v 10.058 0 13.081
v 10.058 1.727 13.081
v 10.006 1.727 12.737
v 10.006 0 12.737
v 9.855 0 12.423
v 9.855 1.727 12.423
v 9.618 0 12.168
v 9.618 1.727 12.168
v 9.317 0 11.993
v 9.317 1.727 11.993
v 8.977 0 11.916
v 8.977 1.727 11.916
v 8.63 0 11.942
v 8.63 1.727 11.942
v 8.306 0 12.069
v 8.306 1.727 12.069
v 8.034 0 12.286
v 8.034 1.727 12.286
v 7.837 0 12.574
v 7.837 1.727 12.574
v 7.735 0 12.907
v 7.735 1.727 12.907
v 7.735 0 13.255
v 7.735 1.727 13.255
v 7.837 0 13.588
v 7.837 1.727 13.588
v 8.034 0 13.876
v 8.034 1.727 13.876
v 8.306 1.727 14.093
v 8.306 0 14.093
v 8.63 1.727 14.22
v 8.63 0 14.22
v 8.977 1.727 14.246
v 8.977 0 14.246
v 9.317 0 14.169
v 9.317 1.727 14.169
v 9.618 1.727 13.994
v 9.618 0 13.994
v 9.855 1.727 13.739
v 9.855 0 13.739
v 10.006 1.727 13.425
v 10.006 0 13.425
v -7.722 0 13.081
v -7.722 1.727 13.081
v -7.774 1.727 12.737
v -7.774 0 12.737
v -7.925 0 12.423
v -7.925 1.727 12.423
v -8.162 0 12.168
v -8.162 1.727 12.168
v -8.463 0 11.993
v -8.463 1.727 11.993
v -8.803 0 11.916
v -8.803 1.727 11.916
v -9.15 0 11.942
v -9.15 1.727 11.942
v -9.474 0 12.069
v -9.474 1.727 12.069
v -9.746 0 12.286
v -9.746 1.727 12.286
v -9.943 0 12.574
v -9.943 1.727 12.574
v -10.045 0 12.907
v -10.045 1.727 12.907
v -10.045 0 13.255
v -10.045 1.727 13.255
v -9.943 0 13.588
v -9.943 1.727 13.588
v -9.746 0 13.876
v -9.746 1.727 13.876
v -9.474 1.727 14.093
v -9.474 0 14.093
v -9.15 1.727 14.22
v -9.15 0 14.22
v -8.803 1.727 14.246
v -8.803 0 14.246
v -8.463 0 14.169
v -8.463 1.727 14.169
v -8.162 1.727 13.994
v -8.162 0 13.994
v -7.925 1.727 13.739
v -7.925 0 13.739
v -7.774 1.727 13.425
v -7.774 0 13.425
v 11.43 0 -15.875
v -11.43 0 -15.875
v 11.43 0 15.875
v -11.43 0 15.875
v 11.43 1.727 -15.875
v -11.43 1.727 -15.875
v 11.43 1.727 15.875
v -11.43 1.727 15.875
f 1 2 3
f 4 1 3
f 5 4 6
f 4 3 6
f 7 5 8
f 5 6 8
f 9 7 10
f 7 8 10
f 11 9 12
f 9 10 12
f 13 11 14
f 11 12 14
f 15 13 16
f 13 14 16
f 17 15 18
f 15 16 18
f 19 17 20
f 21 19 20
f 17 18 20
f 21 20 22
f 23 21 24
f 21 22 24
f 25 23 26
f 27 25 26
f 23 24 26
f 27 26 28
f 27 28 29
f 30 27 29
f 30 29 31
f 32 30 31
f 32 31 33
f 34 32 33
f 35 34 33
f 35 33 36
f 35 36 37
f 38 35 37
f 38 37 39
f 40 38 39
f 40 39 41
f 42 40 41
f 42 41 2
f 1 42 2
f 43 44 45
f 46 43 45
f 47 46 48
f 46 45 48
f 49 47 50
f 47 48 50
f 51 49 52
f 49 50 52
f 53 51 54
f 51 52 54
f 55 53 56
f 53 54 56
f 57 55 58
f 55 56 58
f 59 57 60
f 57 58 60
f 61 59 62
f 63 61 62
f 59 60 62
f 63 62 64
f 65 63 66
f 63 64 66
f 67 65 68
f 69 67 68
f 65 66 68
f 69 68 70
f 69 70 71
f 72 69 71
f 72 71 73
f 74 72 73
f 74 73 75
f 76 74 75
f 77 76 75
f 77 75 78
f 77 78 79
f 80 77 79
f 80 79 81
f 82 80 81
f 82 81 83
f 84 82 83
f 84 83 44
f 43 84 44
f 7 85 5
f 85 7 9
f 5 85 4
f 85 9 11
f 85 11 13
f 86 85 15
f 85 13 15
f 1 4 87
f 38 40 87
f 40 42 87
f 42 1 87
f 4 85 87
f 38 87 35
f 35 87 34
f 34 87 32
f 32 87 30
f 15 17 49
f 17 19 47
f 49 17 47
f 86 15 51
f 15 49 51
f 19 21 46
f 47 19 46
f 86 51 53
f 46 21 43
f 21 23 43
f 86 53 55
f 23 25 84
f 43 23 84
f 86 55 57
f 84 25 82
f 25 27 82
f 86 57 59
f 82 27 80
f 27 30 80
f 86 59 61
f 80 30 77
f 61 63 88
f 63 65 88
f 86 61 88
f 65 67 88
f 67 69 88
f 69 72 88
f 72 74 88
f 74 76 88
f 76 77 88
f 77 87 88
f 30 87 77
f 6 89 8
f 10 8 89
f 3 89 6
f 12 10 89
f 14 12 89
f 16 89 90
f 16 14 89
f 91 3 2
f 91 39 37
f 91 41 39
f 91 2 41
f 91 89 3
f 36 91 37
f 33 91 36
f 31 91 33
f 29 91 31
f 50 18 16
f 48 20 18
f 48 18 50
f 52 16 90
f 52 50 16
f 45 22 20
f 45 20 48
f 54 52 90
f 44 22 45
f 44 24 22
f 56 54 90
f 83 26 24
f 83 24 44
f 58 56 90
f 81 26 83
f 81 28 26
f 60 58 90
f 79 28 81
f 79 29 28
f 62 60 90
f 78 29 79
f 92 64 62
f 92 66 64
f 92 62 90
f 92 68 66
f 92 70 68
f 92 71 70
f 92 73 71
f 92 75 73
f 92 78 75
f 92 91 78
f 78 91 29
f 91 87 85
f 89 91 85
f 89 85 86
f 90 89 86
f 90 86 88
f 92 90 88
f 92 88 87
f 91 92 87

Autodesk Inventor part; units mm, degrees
ref_plane "XZ Plane" through (0, 0, 0) normal (0, 1, 0) x (-1, 0, 0)
sketch "Sketch1" plane through (0, 0, 0) normal (0, 1, 0) x (-1, 0, 0)
  line L0 (11.43, 15.875) -> (-11.43, 15.875)
  line L1 (-11.43, 15.875) -> (-11.43, -15.875)
  line L2 (-11.43, -15.875) -> (11.43, -15.875)
  line L3 (11.43, -15.875) -> (11.43, 15.875)
  line L4 (11.43, 15.875) -> (-11.43, -15.875) construction
  line L5 (-11.43, 15.875) -> (11.43, -15.875) construction
  point P0 (0, 0)
  dimension "d0" = 22.86
  dimension "d1" = 31.75
extrude "Extrusion1" add sketch "Sketch1" along normal blind 1.7272
sketch "Sketch2" plane through (0, 1.7272, 0) normal (0, 1, 0) x (1, 0, 0)
  line L0 (-11.2735, -13.081) -> (11.43, -13.081) construction
  line L1 (11.43, -15.875) -> (11.43, 15.875) construction
  circle A0 centre (-8.89, -13.081) radius 1.1684
  circle A1 centre (8.89, -13.081) radius 1.1684
  line L2 (-11.43, -15.875) -> (11.43, -15.875) projected
  line L3 (-11.43, 15.875) -> (-11.43, -15.875) projected
  point P0 (0, 0)
  dimension "d4" = 2.794
  dimension "d5" = 2.54
  dimension "d6" = 2.54
  dimension "d7" = 2.3368
  dimension "d8" = 2.3368
extrude "Extrusion2" cut sketch "Sketch2" against normal through all
equation "\"d0\" = boardWidth"
equation "\"d1\" = boardLength"
equation "\"d2\" = boardThickness"
equation "\"d4\" = centerLineForHoles"
equation "\"d5\" = holeDistanceFromEdge"
equation "\"d6\" = holeDistanceFromEdge"
equation "\"d7\" = holeDiam"
equation "\"d8\" = holeDiam"
equation "\"d9\" = boardThickness"
equation "\"boardWidth\" = 22.86"
equation "\"boardLength\" = 31.75"
equation "\"boardThickness\" = 1.7272"
equation "\"componentHeightAboveBoard\" = 3.9878"
equation "\"headerHeightAboveBard\" = 8.7376"
equation "\"holeDiam\" = 2.3368"
equation "\"centerLineForHoles\" = 2.794"
equation "\"holeDistanceFromEdge\" = 2.54"
equation "\"supportWidth\" = 25.4"
properties part number "ADXL_345" material "ABS Plastic"
